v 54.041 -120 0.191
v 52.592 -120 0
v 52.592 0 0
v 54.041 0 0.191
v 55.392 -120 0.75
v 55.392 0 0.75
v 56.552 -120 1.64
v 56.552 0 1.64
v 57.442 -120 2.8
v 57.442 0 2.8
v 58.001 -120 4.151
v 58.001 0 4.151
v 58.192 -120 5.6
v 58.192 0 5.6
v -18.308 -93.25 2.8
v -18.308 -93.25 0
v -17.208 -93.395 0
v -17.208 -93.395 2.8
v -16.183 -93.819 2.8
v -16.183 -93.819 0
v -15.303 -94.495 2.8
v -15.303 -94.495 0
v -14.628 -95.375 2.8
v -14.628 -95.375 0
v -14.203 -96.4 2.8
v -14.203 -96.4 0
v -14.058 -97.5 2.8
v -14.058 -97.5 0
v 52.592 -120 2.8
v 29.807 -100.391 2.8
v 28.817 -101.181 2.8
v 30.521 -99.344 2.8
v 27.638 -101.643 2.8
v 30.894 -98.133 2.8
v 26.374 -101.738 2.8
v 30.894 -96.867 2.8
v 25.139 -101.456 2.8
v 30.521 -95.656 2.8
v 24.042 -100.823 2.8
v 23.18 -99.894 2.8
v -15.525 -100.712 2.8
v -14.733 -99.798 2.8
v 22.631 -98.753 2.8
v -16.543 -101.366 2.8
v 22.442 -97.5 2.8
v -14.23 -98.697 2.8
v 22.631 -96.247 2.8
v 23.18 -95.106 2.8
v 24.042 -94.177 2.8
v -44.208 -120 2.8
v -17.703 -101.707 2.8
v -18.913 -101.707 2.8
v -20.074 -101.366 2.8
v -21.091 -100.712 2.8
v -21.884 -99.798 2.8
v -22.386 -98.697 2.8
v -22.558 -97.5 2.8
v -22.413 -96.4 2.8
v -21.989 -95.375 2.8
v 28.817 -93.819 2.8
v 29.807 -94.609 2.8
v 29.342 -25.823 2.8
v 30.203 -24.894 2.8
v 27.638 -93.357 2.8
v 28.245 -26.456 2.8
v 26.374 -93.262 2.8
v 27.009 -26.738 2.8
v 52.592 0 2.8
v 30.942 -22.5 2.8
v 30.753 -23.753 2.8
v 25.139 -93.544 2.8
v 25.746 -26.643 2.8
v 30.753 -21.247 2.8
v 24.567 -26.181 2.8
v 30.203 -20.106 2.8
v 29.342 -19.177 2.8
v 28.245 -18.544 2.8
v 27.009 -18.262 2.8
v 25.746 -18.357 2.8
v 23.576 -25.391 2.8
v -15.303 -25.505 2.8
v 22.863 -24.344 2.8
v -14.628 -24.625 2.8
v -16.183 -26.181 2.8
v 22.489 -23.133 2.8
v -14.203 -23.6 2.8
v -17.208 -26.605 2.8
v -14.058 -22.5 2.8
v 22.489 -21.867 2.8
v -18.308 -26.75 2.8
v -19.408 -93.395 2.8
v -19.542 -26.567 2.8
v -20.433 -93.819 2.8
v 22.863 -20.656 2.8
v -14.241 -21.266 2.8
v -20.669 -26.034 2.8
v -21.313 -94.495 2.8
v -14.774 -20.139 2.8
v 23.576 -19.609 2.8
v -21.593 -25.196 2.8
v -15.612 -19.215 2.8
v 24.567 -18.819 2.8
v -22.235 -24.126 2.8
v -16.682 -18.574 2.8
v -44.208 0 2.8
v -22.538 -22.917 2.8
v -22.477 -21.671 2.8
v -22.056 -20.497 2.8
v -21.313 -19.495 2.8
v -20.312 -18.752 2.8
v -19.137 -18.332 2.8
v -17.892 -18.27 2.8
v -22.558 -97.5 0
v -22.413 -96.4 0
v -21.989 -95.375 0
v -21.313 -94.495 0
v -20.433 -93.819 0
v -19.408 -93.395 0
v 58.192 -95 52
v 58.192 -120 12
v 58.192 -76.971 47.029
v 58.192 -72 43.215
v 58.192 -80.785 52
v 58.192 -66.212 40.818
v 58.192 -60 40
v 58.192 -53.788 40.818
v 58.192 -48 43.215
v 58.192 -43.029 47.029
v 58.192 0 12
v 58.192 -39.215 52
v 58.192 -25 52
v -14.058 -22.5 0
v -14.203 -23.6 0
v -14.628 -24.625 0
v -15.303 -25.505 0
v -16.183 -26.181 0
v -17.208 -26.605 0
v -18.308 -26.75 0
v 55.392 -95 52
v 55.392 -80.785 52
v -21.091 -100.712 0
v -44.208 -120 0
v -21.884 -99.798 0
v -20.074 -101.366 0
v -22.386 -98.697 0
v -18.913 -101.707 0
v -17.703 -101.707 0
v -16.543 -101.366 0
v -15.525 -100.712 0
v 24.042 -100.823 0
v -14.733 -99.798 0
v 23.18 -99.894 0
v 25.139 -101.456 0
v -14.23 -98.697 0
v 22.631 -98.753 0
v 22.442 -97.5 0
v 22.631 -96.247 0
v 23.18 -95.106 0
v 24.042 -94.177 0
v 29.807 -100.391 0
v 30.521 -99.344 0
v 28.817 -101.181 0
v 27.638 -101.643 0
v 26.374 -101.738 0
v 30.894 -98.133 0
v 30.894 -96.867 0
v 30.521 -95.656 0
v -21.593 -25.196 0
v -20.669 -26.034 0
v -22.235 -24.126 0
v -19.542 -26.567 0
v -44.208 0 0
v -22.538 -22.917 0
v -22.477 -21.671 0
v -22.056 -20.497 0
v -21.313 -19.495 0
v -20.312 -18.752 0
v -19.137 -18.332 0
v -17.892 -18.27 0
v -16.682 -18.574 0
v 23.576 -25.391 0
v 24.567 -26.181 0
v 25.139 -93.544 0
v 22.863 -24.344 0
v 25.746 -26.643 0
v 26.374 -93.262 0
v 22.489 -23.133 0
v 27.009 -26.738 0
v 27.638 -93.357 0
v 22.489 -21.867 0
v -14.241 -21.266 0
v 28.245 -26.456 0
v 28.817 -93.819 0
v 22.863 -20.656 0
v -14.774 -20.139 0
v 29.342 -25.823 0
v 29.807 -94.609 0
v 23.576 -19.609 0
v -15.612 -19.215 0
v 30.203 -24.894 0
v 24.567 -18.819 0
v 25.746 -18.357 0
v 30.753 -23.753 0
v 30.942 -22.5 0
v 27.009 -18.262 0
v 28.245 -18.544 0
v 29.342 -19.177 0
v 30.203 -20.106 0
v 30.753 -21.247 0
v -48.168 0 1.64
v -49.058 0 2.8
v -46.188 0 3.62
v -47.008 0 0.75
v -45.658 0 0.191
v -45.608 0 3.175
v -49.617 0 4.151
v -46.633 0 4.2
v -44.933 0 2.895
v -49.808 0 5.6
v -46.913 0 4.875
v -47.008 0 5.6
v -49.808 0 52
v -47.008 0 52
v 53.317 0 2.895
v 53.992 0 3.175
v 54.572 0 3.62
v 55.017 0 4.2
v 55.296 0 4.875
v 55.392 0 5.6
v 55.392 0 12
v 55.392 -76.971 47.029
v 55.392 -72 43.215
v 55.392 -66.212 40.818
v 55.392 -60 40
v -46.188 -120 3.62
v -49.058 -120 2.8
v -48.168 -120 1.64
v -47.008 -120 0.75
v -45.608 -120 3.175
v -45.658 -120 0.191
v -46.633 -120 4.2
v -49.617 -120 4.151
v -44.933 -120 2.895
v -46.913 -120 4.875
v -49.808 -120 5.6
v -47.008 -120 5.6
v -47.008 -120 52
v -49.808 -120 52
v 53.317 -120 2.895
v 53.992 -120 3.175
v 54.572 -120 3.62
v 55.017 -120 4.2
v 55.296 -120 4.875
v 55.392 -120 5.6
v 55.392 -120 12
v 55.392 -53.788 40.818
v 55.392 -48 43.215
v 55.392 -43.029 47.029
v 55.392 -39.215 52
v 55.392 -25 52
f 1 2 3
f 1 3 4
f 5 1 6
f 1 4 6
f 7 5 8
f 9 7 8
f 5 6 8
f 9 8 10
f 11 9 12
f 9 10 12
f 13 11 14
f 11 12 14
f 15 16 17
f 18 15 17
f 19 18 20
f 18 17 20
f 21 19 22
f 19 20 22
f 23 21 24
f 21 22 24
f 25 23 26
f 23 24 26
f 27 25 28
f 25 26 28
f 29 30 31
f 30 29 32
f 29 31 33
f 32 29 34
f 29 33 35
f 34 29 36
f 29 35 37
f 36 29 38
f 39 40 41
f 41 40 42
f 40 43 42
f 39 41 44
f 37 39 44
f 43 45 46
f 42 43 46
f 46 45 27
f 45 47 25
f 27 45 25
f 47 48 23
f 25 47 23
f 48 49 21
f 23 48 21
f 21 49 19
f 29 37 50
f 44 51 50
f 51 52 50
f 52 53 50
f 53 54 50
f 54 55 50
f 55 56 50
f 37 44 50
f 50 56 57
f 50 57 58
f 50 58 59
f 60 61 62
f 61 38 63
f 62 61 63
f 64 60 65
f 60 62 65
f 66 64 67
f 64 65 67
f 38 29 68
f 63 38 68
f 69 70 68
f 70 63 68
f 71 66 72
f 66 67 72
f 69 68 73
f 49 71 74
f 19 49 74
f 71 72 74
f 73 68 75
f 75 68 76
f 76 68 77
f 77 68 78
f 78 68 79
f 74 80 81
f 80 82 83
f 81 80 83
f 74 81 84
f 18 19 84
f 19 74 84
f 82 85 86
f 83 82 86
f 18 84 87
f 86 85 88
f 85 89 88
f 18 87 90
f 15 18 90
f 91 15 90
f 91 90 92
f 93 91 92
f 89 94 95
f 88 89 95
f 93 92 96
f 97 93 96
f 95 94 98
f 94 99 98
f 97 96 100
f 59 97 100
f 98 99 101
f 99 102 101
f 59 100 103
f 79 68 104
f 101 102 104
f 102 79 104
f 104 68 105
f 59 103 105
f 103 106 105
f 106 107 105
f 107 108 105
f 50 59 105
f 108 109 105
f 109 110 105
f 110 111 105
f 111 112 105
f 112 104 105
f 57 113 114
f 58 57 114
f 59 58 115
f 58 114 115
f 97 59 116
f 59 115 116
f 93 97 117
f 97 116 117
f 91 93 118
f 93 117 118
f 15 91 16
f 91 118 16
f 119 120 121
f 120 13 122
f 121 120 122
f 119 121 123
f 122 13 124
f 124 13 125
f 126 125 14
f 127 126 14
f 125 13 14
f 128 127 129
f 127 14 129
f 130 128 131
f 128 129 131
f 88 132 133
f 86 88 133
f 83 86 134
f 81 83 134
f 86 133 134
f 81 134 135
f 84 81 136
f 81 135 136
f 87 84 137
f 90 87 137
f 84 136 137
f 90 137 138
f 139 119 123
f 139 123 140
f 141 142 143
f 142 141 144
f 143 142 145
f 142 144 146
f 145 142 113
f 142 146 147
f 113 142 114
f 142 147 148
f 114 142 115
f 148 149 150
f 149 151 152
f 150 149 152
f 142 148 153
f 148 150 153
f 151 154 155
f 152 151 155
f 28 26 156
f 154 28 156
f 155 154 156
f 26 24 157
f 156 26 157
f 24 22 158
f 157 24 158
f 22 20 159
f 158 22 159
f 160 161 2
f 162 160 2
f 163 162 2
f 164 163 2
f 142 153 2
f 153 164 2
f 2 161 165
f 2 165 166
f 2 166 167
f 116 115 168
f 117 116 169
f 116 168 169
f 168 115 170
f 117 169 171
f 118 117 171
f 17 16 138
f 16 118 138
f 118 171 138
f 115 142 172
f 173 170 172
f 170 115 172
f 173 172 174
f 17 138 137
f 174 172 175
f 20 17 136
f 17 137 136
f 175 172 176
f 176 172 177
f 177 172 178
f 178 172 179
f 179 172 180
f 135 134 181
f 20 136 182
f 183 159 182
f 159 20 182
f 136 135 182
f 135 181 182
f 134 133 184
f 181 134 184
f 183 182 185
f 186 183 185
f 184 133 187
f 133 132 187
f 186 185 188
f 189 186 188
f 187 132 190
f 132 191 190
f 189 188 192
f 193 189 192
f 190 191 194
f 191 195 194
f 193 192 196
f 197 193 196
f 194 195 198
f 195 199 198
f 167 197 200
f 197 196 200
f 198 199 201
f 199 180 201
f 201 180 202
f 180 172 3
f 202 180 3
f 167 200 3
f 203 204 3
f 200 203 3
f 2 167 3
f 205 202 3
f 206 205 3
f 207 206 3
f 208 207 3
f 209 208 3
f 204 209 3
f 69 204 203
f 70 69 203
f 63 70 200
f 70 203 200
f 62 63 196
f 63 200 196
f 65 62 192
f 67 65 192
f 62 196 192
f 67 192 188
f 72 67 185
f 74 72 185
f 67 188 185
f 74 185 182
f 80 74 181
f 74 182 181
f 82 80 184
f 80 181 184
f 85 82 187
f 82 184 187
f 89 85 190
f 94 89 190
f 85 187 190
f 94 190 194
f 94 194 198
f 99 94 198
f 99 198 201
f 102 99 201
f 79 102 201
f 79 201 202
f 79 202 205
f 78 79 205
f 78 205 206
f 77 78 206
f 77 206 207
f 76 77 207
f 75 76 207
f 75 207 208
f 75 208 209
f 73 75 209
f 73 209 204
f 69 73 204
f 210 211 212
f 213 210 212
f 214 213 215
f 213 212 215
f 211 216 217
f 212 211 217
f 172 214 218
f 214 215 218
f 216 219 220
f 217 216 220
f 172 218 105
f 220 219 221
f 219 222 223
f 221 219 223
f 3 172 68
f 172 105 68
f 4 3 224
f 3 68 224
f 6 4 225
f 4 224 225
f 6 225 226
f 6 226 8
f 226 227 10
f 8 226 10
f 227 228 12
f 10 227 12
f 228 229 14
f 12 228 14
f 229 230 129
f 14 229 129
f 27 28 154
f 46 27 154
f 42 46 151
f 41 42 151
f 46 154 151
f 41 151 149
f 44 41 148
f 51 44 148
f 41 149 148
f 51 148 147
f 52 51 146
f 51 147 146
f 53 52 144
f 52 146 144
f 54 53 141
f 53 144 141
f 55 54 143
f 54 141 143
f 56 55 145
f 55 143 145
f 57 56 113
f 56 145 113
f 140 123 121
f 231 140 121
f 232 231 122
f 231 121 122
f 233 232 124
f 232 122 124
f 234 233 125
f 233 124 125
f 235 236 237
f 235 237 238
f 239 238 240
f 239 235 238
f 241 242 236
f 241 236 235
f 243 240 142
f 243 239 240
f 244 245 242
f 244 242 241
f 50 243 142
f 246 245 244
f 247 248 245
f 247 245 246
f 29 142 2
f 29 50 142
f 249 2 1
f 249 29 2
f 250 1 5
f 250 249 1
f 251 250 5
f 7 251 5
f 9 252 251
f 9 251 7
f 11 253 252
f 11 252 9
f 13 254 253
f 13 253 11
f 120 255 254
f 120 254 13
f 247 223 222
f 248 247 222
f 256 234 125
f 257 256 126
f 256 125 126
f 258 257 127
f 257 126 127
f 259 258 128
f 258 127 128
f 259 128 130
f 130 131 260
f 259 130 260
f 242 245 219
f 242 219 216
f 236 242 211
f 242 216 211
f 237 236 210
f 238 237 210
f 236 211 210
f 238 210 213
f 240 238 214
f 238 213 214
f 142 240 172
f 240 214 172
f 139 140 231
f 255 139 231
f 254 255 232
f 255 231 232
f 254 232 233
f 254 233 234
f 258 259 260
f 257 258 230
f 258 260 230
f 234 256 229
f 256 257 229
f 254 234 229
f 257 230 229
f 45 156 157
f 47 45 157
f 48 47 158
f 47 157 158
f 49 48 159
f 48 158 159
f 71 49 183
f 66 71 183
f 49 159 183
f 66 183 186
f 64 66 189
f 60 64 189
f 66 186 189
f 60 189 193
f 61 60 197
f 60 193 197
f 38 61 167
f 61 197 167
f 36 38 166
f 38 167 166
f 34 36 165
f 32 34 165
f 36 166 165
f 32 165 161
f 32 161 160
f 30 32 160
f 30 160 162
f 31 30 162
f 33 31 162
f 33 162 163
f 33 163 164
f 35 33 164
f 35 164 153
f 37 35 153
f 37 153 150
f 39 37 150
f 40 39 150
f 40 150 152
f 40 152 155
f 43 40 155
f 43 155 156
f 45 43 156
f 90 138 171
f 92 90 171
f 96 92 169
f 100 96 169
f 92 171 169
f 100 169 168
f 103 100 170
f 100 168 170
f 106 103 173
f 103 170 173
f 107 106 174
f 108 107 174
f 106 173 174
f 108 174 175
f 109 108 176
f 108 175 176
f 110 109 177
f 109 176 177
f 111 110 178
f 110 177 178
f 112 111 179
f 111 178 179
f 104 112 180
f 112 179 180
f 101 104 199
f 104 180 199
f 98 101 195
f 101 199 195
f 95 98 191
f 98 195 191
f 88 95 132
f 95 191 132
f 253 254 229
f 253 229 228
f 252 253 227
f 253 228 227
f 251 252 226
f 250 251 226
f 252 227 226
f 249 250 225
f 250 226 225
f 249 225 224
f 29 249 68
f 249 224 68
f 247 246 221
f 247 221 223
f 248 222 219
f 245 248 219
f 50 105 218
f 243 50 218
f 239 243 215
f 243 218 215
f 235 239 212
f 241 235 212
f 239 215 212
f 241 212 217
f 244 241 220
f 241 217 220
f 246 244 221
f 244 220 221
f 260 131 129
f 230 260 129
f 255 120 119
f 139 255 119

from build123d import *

# Parameters (mm, degrees)
F1_DEPTH = 120
F3_DEPTH = 3
F4_R     = 4.25
F5_DEPTH = 3


with BuildPart() as f1:
    # F0 (on Front) → F1 (new body)
    with BuildSketch(Plane.XZ):
        with BuildLine():
            ThreePointArc((-49.808191, 5.6), (-48.167989, 1.640202), (-44.208191, 0))
            Line((-44.208191, 0), (52.591809, 0))
            ThreePointArc((52.591809, 0), (56.551607, 1.640202), (58.191809, 5.6))
            Line((58.191809, 5.6), (58.191809, 52))
            Line((58.191809, 52), (55.391809, 52))
            Line((55.391809, 52), (55.391809, 5.6))
            ThreePointArc((55.391809, 5.6), (54.571708, 3.620101), (52.591809, 2.8))
            Line((52.591809, 2.8), (6.991809, 2.8))
            Line((6.991809, 2.8), (-44.208191, 2.8))
            ThreePointArc((-44.208191, 2.8), (-46.18809, 3.620101), (-47.008191, 5.6))
            Line((-47.008191, 5.6), (-47.008191, 52))
            Line((-47.008191, 52), (-49.808191, 52))
            Line((-49.808191, 52), (-49.808191, 5.6))
        make_face()
    extrude(amount=F1_DEPTH)

    # F2 (on face) → F3 (cut)
    with BuildSketch(Plane.YZ.offset(58.191809)):
        Polygon((-95, 52), (-120, 52), (-120, 12), align=None)
        with BuildLine():
            Line((-60, 64), (-60, 52))
            Line((-60, 52), (-60, 40))
            ThreePointArc((-60, 40), (-43.029437, 47.029437), (-36, 64))
            Line((-36, 64), (-60, 64))
        make_face()
        with BuildLine():
            Line((-60, 40), (-60, 52))
            Line((-60, 52), (-60, 64))
            Line((-60, 64), (-84, 64))
            ThreePointArc((-84, 64), (-76.970563, 47.029437), (-60, 40))
        make_face()
        with BuildLine():
            Line((-84, 64), (-60, 64))
            Line((-60, 64), (-36, 64))
            ThreePointArc((-36, 64), (-60, 88), (-84, 64))
        make_face()
        Polygon((0, 52), (-25, 52), (0, 12), align=None)
    extrude(amount=-F3_DEPTH, mode=Mode.SUBTRACT)

    # F4 (on face) → F5 (cut)
    with BuildSketch(Plane(origin=(0, 0, 0), x_dir=(1, 0, 0), z_dir=(0, 0, -1))):
        with BuildLine():
            Line((-22.558191, 97.5), (-18.308191, 97.5))
            Line((-18.308191, 97.5), (-14.058191, 97.5))
            ThreePointArc((-14.058191, 97.5), (-18.308191, 101.75), (-22.558191, 97.5))
        make_face()
        with BuildLine():
            Line((-18.308191, 93.25), (-18.308191, 97.5))
            Line((-18.308191, 97.5), (-22.558191, 97.5))
            ThreePointArc((-22.558191, 97.5), (-21.313395, 94.494796), (-18.308191, 93.25))
        make_face()
        with BuildLine():
            Line((-14.058191, 97.5), (-18.308191, 97.5))
            Line((-18.308191, 97.5), (-18.308191, 93.25))
            ThreePointArc((-18.308191, 93.25), (-15.302987, 94.494796), (-14.058191, 97.5))
        make_face()
        with BuildLine():
            ThreePointArc((30.941809, 97.5), (26.691809, 101.75), (22.441809, 97.5))
            Line((22.441809, 97.5), (30.941809, 97.5))
        make_face()
        with BuildLine():
            Line((30.941809, 97.5), (22.441809, 97.5))
            ThreePointArc((22.441809, 97.5), (26.691809, 93.25), (30.941809, 97.5))
        make_face()
        with BuildLine():
            ThreePointArc((-14.058191, 22.5), (-15.302987, 25.505204), (-18.308191, 26.75))
            ThreePointArc((-18.308191, 26.75), (-21.313395, 19.494796), (-14.058191, 22.5))
        make_face()
        with Locations((26.691809, 22.5)):
            Circle(F4_R)
    extrude(amount=-F5_DEPTH, mode=Mode.SUBTRACT)


solid = f1.part
